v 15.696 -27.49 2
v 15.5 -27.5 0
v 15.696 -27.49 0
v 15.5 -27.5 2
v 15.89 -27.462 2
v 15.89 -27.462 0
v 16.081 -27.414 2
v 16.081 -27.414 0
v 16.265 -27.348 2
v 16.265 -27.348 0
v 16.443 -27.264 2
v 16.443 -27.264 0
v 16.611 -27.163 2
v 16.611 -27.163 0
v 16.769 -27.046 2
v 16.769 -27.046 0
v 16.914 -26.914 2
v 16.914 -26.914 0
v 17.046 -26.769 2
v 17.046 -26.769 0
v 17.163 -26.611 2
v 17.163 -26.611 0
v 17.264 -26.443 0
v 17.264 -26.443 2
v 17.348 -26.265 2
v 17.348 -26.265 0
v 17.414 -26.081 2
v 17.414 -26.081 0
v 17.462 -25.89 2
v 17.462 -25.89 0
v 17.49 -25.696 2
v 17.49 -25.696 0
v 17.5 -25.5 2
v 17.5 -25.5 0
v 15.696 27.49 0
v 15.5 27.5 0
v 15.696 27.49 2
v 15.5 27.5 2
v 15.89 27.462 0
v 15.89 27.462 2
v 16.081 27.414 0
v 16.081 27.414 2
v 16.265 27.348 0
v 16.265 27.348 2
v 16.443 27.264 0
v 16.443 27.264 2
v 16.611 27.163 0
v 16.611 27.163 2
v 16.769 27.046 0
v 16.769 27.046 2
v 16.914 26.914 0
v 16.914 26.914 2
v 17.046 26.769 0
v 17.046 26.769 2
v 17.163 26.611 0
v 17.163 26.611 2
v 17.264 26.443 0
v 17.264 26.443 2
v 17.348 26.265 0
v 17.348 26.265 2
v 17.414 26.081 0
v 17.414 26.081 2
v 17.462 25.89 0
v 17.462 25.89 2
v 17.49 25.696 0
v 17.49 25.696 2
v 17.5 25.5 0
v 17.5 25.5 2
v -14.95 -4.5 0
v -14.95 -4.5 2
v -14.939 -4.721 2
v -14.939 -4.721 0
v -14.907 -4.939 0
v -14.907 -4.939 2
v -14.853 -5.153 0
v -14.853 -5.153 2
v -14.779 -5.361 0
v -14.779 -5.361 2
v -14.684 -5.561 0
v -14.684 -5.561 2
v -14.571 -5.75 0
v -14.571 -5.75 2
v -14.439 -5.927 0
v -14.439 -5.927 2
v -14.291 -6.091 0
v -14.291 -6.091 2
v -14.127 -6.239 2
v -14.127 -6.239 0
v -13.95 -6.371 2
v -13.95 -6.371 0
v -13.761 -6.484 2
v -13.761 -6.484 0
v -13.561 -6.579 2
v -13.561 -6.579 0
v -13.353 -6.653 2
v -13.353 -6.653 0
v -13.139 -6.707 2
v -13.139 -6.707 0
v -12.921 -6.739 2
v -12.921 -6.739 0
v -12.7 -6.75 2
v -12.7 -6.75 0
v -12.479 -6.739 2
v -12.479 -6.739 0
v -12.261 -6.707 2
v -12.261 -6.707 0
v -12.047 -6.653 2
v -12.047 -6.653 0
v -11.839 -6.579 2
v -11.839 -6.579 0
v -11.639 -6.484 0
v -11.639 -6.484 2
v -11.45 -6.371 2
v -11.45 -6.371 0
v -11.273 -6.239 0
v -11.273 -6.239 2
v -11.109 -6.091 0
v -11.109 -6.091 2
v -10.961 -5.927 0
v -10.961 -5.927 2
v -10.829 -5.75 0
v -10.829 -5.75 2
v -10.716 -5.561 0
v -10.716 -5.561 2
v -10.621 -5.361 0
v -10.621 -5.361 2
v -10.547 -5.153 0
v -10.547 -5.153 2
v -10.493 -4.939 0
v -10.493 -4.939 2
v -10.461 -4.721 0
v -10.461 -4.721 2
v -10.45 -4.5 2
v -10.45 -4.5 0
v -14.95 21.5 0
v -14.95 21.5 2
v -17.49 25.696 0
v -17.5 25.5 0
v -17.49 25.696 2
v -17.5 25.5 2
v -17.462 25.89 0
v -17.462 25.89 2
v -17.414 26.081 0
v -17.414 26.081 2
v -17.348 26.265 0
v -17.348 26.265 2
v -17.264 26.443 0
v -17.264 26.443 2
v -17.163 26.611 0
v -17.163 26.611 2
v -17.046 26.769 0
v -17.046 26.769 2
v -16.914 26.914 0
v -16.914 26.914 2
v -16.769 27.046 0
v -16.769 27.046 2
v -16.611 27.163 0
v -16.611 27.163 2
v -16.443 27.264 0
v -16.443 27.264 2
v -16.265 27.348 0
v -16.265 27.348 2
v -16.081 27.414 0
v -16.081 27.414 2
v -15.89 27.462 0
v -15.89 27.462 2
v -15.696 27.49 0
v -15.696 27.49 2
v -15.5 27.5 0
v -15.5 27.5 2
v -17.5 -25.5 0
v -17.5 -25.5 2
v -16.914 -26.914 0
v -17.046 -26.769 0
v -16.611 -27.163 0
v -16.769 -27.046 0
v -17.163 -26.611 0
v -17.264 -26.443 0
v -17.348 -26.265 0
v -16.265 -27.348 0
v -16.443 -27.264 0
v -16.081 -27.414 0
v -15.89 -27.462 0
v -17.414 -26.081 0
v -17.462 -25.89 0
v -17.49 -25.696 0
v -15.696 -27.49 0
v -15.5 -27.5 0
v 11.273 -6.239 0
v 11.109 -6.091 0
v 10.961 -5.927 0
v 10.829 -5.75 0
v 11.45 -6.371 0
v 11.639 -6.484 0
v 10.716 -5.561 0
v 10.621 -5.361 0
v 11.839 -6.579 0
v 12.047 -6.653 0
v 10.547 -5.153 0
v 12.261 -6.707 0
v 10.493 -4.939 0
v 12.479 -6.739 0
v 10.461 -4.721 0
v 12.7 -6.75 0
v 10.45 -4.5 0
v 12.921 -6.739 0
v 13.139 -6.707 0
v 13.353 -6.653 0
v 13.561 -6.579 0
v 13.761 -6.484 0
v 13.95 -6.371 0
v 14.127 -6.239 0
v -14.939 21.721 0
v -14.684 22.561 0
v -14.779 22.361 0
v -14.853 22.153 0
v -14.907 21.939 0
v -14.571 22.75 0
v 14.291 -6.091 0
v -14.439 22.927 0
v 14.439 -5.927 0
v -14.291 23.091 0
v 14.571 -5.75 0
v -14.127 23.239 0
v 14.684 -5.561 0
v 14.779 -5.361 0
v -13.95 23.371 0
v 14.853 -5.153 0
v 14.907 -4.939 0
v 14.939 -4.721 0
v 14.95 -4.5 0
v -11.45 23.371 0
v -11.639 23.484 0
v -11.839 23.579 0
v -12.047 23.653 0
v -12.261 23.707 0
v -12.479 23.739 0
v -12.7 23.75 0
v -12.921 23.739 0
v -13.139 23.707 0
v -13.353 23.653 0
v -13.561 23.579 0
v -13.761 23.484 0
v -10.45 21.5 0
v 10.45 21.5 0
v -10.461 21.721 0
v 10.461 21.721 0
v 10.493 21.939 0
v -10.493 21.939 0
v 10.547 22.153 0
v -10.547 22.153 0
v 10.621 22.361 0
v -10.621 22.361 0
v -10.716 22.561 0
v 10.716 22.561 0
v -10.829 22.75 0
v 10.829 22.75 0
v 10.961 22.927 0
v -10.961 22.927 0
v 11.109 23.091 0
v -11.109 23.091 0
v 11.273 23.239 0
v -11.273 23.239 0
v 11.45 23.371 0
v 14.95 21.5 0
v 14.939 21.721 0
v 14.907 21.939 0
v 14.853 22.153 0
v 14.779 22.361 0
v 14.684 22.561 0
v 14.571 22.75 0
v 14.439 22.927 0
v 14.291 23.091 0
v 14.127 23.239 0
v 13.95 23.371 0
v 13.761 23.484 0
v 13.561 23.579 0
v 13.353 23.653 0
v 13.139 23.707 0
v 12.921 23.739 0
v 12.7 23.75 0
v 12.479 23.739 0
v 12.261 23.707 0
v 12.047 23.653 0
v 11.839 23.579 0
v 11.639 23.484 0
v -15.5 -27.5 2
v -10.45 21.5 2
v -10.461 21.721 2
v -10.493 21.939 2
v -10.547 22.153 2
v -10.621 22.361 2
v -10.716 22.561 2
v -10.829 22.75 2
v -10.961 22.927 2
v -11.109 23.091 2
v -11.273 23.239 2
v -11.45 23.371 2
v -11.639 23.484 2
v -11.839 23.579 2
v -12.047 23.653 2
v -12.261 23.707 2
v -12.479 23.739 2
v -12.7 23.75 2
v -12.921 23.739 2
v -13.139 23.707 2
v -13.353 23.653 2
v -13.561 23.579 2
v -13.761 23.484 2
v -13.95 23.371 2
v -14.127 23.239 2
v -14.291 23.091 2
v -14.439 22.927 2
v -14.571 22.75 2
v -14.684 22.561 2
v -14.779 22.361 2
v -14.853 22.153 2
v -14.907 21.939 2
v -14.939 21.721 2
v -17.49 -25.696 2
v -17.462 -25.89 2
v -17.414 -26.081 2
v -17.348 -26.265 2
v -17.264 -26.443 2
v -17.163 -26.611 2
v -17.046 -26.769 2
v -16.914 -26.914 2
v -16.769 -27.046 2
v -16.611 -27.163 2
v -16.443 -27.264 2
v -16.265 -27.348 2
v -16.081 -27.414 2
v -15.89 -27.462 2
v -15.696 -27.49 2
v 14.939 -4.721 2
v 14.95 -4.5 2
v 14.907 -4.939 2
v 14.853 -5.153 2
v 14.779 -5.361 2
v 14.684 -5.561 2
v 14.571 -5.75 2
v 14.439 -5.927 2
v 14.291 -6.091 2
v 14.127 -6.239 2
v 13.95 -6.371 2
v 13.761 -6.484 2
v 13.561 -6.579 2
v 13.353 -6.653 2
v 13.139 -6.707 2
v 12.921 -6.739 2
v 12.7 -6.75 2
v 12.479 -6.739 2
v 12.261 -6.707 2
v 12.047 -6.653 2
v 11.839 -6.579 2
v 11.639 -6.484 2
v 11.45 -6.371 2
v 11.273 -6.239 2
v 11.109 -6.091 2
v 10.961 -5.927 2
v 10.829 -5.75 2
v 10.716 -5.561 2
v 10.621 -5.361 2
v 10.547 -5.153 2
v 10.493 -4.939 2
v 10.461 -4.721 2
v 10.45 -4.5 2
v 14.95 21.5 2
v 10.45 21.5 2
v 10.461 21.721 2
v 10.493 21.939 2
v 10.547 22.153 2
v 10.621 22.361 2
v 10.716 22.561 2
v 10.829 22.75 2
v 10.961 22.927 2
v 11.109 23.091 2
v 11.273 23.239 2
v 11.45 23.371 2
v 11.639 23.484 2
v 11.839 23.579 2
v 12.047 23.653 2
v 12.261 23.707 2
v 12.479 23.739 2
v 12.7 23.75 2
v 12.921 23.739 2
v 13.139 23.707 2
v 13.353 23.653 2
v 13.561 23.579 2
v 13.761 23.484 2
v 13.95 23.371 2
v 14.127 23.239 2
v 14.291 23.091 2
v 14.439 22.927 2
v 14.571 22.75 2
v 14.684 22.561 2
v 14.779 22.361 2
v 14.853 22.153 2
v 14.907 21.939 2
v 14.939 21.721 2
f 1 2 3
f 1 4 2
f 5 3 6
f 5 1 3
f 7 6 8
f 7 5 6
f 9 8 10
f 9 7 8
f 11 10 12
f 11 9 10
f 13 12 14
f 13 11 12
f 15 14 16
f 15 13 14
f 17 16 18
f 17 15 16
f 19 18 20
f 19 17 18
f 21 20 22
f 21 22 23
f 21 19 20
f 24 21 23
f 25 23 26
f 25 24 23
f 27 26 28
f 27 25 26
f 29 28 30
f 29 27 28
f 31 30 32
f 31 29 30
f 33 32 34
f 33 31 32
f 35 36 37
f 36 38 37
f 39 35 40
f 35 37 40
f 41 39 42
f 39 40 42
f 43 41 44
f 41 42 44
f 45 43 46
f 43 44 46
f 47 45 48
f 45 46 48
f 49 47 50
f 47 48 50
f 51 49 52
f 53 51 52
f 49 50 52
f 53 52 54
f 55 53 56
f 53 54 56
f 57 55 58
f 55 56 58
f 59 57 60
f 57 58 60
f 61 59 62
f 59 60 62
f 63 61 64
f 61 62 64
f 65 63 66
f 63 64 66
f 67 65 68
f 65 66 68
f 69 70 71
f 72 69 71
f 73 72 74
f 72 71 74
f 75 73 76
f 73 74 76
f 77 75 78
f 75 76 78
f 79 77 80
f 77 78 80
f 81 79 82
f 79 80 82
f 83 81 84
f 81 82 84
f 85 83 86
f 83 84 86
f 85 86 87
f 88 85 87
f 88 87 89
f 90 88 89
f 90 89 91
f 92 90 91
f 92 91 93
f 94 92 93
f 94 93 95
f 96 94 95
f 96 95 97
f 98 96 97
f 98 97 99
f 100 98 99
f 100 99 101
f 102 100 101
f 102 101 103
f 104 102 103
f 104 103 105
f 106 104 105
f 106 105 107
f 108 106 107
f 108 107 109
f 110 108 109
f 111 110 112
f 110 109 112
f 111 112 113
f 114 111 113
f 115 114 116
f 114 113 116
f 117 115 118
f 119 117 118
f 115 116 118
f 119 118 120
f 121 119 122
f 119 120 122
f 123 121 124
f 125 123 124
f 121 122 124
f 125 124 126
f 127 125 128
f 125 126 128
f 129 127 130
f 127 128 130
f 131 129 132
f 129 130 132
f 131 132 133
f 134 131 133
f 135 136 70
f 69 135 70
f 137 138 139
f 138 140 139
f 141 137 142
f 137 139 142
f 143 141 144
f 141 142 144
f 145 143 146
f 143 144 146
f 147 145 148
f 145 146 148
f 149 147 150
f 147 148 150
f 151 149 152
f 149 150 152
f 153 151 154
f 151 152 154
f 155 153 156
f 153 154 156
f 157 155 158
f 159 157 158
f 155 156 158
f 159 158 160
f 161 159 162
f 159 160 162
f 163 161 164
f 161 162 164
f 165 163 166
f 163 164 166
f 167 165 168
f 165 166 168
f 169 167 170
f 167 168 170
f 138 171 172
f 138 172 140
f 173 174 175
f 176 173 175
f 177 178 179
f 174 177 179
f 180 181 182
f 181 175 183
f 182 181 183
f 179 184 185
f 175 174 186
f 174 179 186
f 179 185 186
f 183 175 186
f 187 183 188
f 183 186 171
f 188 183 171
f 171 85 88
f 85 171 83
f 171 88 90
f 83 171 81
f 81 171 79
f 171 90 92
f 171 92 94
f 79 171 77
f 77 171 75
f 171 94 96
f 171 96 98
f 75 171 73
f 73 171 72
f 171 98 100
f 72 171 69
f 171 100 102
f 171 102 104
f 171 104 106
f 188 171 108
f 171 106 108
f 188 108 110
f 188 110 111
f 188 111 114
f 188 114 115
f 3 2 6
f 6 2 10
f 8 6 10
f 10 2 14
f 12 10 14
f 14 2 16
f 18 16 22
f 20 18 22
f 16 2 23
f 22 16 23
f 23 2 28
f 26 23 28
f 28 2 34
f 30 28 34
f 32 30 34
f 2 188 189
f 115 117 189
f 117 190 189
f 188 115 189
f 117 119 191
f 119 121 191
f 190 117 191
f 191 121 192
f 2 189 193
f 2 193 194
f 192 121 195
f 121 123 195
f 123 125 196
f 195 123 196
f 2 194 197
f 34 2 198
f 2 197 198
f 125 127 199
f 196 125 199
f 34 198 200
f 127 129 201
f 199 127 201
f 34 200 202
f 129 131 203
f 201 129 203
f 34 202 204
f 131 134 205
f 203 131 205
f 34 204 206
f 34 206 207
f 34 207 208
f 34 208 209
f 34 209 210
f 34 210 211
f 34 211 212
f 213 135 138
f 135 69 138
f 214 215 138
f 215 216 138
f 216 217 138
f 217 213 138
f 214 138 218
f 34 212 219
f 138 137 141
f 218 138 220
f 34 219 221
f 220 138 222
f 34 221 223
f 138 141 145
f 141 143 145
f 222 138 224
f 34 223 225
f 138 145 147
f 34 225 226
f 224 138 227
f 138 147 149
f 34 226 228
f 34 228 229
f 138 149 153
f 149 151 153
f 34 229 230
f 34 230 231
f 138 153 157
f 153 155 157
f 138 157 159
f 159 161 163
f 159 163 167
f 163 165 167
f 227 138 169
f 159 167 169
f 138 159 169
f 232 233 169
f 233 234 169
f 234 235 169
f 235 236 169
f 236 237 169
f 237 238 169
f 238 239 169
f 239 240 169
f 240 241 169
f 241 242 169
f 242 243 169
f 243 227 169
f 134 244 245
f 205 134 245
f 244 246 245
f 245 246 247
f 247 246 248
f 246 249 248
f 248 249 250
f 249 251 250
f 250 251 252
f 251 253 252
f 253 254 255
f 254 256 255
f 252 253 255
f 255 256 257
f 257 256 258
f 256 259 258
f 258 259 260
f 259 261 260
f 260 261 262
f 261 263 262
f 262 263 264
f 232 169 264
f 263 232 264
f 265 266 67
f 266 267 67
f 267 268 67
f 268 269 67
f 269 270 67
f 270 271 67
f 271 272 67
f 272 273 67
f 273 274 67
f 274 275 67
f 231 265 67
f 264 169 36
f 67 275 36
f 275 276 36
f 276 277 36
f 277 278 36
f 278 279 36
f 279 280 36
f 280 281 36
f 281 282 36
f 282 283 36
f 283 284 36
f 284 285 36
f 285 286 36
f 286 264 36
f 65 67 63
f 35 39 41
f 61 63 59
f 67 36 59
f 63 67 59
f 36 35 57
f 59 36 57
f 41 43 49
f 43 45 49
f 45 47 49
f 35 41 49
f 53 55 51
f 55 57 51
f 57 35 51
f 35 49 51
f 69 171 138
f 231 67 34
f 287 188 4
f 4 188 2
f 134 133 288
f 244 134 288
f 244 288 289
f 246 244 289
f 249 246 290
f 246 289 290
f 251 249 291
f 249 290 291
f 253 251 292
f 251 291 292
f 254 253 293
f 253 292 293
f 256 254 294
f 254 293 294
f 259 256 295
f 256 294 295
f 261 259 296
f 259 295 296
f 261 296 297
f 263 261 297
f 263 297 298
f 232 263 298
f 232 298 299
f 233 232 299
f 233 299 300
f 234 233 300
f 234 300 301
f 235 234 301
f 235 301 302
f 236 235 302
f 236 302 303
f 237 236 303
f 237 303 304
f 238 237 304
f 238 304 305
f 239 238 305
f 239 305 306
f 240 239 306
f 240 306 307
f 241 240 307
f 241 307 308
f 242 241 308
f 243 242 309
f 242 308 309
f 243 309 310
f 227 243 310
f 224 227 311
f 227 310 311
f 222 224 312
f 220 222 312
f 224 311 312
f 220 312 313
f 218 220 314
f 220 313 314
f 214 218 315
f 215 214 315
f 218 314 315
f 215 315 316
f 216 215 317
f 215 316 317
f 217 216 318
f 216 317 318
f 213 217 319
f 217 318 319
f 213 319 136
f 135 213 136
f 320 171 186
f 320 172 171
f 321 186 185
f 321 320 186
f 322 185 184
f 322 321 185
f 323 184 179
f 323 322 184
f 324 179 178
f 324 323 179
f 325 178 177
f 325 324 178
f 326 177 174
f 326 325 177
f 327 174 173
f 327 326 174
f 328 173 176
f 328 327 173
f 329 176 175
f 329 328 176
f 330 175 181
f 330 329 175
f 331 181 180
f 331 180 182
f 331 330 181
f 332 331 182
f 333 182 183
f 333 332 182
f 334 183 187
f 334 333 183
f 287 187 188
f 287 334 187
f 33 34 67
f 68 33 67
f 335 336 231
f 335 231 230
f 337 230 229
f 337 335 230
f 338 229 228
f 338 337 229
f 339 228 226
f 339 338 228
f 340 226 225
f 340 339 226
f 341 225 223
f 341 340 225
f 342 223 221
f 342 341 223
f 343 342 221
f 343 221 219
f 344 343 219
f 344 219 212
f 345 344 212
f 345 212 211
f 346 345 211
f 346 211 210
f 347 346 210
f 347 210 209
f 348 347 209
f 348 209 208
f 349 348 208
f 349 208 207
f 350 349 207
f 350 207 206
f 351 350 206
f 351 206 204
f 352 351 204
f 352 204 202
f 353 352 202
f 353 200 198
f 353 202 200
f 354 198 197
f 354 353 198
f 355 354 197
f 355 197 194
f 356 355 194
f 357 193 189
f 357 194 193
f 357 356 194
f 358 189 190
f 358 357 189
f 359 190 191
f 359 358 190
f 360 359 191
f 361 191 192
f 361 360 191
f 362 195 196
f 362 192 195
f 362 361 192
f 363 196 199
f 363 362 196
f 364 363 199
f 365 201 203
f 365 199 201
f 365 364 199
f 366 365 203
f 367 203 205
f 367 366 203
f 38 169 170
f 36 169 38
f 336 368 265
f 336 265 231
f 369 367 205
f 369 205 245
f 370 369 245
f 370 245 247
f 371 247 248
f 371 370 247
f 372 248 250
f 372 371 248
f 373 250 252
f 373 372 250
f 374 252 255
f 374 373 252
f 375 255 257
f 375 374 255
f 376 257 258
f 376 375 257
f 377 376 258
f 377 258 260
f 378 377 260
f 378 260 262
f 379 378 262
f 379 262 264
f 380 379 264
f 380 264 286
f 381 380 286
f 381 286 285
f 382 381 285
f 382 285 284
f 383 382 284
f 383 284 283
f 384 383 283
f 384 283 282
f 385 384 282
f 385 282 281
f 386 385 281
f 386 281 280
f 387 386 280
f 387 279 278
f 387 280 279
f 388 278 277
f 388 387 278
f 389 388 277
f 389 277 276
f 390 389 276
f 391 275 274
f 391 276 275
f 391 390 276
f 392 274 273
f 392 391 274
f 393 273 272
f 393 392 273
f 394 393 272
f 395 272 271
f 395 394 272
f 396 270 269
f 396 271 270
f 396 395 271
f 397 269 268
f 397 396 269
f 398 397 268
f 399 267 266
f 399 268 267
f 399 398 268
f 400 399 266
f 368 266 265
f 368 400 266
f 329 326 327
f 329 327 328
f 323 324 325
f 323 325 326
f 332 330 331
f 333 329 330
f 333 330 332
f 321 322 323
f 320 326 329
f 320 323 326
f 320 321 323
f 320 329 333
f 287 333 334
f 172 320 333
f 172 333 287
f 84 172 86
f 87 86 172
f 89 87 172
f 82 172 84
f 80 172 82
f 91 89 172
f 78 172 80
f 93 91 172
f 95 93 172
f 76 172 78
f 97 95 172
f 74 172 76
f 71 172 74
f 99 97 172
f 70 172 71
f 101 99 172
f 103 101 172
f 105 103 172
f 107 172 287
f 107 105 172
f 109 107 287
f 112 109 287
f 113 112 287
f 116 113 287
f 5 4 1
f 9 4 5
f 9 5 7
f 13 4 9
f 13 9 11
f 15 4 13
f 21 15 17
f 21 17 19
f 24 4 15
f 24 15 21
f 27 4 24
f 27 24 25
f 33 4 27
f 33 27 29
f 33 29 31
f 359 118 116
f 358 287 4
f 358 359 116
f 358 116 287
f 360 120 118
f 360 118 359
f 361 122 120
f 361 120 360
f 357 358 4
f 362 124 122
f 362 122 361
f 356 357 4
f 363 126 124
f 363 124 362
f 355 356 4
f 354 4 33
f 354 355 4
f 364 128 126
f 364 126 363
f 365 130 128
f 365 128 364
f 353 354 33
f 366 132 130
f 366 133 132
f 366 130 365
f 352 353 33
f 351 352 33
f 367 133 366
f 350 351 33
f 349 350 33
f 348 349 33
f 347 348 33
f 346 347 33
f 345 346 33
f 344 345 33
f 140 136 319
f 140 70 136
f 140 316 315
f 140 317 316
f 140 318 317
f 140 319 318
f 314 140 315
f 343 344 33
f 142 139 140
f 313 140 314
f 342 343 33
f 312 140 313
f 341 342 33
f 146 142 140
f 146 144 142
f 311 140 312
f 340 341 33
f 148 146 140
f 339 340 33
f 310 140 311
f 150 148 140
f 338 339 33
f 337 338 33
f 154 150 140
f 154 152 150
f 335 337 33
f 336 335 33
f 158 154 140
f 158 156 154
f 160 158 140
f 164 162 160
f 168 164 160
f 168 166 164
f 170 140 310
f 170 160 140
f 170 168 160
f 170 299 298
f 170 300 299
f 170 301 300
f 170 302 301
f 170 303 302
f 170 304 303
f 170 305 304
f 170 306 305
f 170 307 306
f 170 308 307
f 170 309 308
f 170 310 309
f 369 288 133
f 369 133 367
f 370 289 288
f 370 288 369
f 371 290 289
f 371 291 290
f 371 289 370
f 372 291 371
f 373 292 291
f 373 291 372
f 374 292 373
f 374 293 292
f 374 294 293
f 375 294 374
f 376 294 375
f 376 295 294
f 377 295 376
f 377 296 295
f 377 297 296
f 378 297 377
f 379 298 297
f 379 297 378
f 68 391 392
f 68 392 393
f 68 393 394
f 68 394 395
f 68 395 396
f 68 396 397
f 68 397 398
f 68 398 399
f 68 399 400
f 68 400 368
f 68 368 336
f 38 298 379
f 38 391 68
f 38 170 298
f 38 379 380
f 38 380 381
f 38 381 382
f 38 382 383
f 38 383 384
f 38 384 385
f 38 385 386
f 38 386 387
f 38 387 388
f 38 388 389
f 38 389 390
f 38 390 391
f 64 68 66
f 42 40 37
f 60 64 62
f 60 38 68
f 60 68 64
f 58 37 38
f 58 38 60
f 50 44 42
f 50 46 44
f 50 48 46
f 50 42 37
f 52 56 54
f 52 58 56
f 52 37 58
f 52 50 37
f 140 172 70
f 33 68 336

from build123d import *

# Parameters (mm, degrees)
SKETCH_1_W          = 35
SKETCH_1_H          = 55
EXTRUDE_1_DEPTH     = 2
CUT_EXTRUDE_1_DEPTH = 10
FILLET_1_R          = 2


with BuildPart() as part:
    # Sketch 1 → 凸台-拉伸1 (new body)
    with BuildSketch(Plane.XY):
        Rectangle(SKETCH_1_W, SKETCH_1_H)
    extrude(amount=EXTRUDE_1_DEPTH)

    # 草图9 → 切除-拉伸1 (cut)
    with BuildSketch(Plane.XY.offset(2)):
        with BuildLine():
            Line((14.95, 21.5), (14.95, -4.5))
            ThreePointArc((14.95, -4.5), (12.7, -6.75), (10.45, -4.5))
            Line((10.45, -4.5), (10.45, 21.5))
            ThreePointArc((10.45, 21.5), (12.7, 23.75), (14.95, 21.5))
        make_face()
        with BuildLine():
            Line((-14.95, 21.5), (-14.95, -4.5))
            ThreePointArc((-14.95, -4.5), (-12.7, -6.75), (-10.45, -4.5))
            Line((-10.45, -4.5), (-10.45, 21.5))
            ThreePointArc((-10.45, 21.5), (-12.7, 23.75), (-14.95, 21.5))
        make_face()
    extrude(amount=-CUT_EXTRUDE_1_DEPTH, mode=Mode.SUBTRACT)

    # 圆角1
    fillet_1_edges = [part.edges().sort_by_distance(p)[0] for p in [
        (17.5, 27.5, 1),
        (17.5, -27.5, 1),
        (-17.5, -27.5, 1),
        (-17.5, 27.5, 1),
    ]]
    fillet(fillet_1_edges, radius=FILLET_1_R)


solid = part.part
